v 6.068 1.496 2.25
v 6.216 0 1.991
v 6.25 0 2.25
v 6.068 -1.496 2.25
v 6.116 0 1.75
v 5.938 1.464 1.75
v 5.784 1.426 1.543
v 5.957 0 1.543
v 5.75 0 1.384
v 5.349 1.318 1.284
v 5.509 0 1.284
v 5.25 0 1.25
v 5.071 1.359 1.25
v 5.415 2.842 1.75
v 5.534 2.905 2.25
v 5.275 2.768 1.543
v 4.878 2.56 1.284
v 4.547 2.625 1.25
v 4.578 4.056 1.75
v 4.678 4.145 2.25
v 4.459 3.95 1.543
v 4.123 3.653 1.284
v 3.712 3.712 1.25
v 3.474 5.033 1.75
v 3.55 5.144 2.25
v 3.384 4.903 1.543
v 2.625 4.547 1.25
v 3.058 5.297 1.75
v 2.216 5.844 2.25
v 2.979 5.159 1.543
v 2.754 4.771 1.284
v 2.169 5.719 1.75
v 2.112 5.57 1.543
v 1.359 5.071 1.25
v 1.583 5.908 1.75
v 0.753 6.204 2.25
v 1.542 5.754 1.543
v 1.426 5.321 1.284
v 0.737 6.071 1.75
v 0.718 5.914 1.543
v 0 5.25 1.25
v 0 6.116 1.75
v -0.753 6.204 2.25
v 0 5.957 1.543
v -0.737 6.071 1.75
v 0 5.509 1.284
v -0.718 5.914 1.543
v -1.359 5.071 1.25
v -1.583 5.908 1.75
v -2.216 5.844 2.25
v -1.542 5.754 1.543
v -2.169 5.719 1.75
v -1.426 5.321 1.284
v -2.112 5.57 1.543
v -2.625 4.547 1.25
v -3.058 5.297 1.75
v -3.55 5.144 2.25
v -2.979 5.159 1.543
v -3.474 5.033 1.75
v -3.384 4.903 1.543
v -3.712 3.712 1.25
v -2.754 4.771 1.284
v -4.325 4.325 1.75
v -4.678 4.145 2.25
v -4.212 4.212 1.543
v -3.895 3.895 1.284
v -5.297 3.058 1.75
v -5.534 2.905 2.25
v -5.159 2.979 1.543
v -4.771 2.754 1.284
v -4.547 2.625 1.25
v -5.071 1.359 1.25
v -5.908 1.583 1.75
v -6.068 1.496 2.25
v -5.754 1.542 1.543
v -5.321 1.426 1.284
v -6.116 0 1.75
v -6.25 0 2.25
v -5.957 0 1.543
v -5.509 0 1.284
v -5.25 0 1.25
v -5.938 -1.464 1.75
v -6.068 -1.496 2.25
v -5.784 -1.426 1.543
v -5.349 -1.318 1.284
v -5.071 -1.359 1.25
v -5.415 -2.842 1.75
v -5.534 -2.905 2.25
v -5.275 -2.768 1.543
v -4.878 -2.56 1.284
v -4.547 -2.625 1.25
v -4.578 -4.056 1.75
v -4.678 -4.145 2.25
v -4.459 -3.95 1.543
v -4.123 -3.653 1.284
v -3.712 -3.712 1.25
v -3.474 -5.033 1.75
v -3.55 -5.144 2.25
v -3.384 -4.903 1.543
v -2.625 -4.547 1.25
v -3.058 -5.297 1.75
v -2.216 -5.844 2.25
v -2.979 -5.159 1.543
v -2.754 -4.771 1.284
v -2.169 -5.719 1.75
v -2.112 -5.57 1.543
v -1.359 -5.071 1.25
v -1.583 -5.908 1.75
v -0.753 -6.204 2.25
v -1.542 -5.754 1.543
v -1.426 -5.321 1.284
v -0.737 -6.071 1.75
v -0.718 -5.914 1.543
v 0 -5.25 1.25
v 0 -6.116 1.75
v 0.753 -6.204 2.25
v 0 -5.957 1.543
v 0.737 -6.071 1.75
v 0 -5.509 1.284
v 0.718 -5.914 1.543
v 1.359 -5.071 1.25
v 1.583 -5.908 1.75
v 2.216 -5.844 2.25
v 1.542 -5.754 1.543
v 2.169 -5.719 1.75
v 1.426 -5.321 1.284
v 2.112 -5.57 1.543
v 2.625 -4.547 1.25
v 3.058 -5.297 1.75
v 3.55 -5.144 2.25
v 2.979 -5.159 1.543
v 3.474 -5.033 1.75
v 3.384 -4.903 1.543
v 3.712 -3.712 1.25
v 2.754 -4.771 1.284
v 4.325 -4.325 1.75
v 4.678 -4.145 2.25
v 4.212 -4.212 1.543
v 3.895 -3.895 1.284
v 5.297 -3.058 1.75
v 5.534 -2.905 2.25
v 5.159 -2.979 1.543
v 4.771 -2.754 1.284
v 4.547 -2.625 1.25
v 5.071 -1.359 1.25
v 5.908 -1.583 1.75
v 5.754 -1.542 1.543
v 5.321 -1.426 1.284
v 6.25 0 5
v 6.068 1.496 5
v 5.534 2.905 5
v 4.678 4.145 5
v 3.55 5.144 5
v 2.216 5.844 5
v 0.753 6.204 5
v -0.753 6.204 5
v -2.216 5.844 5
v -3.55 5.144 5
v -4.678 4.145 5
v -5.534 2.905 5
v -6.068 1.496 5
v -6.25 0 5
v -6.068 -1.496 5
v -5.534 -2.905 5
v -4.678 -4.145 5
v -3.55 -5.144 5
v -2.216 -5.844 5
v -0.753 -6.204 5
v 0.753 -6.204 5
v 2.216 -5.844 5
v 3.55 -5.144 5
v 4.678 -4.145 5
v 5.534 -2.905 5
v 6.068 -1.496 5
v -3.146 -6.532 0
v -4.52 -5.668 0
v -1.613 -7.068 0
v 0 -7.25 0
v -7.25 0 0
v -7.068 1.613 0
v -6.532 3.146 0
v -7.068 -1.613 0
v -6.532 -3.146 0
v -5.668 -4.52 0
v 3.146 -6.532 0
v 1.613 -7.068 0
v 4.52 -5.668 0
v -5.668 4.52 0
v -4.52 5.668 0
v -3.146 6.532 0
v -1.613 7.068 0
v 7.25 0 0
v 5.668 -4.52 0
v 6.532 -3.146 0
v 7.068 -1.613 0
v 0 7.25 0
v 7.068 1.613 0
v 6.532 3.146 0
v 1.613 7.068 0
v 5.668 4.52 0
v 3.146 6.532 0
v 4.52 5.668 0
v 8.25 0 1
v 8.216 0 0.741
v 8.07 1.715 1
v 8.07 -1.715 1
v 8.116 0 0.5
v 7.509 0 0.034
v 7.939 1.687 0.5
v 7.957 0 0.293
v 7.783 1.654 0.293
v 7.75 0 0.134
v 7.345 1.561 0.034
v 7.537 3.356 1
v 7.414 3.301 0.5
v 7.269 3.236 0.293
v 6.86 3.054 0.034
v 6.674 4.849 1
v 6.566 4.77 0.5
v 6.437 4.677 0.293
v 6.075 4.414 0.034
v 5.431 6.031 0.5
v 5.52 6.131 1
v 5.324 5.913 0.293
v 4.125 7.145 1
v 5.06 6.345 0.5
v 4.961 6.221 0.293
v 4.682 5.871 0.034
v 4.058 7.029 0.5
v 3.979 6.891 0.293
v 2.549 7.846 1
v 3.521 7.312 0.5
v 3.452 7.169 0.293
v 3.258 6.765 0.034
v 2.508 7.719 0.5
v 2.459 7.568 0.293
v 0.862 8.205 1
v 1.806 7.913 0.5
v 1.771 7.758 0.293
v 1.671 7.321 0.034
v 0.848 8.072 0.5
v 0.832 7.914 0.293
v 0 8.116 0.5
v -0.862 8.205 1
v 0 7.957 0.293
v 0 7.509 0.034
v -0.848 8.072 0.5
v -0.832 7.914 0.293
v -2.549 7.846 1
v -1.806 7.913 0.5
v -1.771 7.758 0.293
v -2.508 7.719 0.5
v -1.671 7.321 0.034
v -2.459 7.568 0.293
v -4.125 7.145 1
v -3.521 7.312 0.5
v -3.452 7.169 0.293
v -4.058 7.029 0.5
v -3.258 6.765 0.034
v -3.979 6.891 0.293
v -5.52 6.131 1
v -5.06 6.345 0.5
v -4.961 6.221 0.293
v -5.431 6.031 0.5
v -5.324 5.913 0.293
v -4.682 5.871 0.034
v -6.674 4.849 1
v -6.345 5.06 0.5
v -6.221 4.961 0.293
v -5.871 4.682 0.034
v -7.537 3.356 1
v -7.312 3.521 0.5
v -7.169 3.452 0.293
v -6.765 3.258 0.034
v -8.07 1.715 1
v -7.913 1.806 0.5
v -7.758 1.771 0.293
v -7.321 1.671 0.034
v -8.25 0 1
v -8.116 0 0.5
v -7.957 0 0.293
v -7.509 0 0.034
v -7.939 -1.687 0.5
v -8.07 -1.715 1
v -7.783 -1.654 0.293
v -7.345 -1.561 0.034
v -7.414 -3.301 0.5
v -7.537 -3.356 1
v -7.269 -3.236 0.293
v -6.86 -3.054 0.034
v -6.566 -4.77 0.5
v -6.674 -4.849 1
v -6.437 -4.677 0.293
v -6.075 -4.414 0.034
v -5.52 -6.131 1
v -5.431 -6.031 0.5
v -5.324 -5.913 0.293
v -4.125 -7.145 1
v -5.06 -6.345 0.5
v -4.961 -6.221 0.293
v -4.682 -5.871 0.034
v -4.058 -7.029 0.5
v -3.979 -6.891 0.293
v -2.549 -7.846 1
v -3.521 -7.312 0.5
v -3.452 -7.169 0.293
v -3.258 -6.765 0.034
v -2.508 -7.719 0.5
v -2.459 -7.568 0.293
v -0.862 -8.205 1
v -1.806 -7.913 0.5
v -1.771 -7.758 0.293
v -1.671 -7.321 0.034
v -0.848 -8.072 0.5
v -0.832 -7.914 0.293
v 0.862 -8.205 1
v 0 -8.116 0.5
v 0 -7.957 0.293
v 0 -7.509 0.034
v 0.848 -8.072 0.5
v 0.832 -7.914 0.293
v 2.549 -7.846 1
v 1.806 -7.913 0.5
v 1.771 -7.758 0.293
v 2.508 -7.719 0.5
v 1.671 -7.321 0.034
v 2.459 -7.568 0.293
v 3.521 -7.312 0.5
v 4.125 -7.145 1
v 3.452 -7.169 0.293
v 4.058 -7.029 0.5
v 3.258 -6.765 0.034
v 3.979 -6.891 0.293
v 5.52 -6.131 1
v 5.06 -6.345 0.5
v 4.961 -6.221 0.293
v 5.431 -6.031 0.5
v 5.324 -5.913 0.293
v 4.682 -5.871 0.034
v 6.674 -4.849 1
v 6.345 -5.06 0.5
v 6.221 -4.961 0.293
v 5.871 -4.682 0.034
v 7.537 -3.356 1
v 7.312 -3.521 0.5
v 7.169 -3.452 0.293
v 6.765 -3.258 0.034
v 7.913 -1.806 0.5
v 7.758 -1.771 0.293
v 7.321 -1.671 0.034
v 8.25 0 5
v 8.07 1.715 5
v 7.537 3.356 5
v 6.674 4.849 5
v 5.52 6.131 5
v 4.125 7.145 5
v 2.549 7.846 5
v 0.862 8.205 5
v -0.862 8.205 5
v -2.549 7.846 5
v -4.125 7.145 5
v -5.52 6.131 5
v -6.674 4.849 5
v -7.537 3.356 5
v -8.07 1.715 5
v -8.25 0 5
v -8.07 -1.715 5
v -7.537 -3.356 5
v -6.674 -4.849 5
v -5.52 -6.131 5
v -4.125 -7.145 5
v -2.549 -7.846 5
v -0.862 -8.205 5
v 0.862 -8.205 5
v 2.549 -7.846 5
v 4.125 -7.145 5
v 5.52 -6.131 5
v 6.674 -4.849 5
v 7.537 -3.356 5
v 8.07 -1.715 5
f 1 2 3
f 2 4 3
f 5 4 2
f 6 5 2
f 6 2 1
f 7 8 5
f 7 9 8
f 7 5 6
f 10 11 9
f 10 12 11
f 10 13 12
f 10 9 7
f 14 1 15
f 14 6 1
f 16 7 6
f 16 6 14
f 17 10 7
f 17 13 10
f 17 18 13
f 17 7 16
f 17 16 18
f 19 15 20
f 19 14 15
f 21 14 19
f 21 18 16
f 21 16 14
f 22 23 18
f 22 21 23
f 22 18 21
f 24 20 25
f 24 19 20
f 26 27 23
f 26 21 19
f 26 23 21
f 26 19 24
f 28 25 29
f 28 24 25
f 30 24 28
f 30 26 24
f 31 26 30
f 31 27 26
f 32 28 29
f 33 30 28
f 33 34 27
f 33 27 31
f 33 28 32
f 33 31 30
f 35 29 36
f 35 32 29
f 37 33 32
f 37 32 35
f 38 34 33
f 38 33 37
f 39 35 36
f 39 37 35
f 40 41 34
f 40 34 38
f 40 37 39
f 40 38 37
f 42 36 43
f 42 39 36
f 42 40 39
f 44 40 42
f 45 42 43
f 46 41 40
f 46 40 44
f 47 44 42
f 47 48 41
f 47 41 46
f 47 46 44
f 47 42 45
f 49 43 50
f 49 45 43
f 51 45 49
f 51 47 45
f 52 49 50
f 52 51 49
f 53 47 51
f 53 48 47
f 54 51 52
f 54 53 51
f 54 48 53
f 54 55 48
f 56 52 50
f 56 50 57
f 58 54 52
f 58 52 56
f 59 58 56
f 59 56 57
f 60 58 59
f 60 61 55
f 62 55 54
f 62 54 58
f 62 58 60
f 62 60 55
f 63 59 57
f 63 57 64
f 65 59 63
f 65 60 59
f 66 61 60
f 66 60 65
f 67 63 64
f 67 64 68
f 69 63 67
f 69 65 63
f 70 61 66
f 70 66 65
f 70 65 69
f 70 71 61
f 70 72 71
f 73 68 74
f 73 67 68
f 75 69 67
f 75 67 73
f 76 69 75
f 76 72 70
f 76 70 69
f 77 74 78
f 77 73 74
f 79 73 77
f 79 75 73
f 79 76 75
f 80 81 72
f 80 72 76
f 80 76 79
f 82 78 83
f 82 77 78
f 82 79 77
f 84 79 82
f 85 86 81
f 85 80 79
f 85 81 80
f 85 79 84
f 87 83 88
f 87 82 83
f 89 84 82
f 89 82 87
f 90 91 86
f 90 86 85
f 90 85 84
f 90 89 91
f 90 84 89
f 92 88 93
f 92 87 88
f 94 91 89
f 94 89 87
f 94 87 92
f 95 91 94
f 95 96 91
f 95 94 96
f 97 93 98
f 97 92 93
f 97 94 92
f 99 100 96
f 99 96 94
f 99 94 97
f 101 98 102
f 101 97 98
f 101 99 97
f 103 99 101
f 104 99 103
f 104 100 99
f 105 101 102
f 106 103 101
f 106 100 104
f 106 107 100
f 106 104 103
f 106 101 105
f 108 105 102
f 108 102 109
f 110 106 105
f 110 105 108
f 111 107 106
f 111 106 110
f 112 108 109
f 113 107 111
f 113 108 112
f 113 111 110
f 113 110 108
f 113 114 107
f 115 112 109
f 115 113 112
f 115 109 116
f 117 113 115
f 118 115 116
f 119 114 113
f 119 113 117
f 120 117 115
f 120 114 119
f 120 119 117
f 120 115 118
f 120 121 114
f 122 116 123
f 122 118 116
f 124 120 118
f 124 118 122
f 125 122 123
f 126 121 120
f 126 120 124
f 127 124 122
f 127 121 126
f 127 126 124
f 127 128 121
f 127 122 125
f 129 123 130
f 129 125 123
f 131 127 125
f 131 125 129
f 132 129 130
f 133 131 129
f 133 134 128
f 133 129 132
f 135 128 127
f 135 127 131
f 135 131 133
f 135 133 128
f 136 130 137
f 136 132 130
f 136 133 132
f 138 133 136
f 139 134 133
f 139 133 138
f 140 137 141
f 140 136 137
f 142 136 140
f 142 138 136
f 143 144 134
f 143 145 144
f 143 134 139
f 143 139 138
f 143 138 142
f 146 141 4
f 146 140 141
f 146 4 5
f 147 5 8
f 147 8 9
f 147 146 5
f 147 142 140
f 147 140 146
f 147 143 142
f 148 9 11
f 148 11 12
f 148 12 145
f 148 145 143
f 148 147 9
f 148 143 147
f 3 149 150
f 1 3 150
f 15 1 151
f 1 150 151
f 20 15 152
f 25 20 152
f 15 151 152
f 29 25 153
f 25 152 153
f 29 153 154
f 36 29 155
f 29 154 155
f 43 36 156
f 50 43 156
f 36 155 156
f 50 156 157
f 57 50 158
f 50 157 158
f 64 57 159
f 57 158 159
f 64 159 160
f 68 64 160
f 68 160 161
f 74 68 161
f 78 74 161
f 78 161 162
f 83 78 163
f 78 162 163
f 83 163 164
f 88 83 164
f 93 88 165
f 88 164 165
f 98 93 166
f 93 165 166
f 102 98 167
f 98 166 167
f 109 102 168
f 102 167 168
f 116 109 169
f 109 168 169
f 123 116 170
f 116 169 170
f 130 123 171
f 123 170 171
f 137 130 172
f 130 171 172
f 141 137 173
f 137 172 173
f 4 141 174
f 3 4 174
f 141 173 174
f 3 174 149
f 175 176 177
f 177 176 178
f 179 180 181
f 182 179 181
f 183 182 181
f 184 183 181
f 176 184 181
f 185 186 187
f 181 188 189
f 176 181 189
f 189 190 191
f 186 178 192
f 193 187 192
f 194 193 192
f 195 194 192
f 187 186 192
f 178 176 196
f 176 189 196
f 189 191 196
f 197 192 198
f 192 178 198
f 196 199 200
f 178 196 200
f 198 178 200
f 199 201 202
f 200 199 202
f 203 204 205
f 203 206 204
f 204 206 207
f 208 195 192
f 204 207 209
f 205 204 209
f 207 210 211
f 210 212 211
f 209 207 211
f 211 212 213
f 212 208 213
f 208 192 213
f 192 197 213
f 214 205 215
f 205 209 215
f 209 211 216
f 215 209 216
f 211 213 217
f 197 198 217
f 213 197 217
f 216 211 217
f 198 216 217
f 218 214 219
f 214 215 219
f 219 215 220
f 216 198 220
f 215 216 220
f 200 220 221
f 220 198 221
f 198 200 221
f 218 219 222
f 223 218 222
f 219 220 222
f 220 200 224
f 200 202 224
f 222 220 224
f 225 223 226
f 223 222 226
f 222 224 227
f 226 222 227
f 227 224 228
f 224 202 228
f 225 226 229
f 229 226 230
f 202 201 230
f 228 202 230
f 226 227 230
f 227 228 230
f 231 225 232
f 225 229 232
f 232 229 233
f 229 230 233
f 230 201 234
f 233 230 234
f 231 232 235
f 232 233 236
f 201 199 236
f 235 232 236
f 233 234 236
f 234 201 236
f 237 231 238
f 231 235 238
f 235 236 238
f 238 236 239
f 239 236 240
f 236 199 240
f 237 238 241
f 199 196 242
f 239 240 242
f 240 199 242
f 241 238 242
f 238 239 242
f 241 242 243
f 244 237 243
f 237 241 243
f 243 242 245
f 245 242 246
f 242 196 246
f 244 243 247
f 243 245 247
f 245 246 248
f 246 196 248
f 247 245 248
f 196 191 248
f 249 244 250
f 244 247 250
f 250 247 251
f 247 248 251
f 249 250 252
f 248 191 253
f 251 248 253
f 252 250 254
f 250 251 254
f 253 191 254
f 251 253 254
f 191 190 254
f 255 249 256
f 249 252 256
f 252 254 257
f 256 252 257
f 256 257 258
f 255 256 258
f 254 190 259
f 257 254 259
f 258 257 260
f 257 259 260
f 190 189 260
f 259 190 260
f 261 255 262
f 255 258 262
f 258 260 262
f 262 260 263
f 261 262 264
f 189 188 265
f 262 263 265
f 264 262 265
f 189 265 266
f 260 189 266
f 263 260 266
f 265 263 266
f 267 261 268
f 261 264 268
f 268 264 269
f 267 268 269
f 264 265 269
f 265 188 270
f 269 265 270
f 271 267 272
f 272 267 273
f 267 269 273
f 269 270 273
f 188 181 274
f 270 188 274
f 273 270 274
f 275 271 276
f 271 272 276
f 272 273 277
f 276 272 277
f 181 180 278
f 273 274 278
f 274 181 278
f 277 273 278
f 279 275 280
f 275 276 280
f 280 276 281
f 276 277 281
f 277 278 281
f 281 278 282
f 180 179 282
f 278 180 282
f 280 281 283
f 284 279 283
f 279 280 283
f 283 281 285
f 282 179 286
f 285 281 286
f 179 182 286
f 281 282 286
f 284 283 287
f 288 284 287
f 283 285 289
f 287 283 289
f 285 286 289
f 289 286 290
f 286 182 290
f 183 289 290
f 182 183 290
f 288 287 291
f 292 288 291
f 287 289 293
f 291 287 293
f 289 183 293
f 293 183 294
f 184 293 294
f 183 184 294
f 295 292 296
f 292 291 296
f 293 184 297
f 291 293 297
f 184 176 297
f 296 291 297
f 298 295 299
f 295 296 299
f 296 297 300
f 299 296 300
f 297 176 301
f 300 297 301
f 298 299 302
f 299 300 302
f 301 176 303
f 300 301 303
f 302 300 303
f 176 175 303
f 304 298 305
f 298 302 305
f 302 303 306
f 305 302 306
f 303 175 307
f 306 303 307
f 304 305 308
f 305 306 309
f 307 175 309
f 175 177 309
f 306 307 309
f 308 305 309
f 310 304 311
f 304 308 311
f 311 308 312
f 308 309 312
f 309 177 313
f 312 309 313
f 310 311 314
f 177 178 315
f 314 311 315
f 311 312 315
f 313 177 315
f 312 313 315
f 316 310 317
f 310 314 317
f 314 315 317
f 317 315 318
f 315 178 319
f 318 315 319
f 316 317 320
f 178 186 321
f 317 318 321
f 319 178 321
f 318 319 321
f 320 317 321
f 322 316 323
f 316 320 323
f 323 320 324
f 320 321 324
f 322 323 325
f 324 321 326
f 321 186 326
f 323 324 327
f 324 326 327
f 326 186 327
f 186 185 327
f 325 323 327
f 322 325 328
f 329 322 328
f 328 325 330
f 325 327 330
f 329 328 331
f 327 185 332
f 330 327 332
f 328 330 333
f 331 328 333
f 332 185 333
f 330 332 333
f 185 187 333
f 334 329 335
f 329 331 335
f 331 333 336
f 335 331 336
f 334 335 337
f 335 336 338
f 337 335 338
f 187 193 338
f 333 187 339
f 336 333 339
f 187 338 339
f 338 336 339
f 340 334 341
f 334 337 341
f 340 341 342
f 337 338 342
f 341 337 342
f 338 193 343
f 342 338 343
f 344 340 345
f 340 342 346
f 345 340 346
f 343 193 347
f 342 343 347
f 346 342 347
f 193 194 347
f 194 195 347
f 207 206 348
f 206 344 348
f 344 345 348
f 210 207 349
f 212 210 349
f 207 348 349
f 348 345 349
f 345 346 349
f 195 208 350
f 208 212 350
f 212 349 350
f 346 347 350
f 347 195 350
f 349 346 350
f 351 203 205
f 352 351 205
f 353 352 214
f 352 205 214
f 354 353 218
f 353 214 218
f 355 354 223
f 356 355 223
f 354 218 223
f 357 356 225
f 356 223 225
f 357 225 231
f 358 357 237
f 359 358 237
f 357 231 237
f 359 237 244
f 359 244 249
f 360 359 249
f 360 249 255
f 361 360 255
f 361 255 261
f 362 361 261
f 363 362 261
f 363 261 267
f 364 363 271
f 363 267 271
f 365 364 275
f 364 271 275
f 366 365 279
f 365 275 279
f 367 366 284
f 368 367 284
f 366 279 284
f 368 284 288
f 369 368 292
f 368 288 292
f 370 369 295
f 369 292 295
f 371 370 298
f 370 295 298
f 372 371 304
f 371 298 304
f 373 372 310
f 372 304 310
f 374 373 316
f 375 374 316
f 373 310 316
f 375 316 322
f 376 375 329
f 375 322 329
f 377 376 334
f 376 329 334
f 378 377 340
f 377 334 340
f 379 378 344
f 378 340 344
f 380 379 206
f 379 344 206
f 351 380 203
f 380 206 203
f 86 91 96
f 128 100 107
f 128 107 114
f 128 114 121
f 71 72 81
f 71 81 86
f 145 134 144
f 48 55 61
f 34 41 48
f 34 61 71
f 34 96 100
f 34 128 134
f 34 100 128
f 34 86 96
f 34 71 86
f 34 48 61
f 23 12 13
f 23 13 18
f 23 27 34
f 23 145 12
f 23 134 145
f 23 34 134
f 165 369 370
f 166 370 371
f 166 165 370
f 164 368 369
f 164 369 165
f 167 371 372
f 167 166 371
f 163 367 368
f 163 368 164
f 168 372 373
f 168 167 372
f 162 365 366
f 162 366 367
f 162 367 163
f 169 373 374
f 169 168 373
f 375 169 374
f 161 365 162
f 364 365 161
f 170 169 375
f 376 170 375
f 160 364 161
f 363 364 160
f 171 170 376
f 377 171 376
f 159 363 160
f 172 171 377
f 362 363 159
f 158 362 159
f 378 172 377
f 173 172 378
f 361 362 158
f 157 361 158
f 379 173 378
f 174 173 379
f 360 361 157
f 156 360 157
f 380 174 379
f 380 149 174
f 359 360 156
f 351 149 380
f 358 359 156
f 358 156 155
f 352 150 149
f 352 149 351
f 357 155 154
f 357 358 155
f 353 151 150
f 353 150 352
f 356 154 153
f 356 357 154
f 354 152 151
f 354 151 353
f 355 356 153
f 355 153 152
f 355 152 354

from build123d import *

# Parameters (mm, degrees)
F0_R     = 8.25
F1_DEPTH = 5
F2_R     = 6.25
F3_DEPTH = 3.75
F4_R     = 1


with BuildPart() as f1:
    # F0 (on Top) → F1 (new body)
    with BuildSketch(Plane.XY):
        Circle(F0_R)
    extrude(amount=F1_DEPTH)

    # F2 (on face) → F3 (cut)
    with BuildSketch(Plane.XY.offset(5)):
        Circle(F2_R)
    extrude(amount=-F3_DEPTH, mode=Mode.SUBTRACT)

    # F4
    f4_edges = [f1.edges().sort_by_distance(p)[0] for p in [
        (-8.25, 0, 0),
        (-6.25, 0, 1.25),
    ]]
    fillet(f4_edges, radius=F4_R)


solid = f1.part
